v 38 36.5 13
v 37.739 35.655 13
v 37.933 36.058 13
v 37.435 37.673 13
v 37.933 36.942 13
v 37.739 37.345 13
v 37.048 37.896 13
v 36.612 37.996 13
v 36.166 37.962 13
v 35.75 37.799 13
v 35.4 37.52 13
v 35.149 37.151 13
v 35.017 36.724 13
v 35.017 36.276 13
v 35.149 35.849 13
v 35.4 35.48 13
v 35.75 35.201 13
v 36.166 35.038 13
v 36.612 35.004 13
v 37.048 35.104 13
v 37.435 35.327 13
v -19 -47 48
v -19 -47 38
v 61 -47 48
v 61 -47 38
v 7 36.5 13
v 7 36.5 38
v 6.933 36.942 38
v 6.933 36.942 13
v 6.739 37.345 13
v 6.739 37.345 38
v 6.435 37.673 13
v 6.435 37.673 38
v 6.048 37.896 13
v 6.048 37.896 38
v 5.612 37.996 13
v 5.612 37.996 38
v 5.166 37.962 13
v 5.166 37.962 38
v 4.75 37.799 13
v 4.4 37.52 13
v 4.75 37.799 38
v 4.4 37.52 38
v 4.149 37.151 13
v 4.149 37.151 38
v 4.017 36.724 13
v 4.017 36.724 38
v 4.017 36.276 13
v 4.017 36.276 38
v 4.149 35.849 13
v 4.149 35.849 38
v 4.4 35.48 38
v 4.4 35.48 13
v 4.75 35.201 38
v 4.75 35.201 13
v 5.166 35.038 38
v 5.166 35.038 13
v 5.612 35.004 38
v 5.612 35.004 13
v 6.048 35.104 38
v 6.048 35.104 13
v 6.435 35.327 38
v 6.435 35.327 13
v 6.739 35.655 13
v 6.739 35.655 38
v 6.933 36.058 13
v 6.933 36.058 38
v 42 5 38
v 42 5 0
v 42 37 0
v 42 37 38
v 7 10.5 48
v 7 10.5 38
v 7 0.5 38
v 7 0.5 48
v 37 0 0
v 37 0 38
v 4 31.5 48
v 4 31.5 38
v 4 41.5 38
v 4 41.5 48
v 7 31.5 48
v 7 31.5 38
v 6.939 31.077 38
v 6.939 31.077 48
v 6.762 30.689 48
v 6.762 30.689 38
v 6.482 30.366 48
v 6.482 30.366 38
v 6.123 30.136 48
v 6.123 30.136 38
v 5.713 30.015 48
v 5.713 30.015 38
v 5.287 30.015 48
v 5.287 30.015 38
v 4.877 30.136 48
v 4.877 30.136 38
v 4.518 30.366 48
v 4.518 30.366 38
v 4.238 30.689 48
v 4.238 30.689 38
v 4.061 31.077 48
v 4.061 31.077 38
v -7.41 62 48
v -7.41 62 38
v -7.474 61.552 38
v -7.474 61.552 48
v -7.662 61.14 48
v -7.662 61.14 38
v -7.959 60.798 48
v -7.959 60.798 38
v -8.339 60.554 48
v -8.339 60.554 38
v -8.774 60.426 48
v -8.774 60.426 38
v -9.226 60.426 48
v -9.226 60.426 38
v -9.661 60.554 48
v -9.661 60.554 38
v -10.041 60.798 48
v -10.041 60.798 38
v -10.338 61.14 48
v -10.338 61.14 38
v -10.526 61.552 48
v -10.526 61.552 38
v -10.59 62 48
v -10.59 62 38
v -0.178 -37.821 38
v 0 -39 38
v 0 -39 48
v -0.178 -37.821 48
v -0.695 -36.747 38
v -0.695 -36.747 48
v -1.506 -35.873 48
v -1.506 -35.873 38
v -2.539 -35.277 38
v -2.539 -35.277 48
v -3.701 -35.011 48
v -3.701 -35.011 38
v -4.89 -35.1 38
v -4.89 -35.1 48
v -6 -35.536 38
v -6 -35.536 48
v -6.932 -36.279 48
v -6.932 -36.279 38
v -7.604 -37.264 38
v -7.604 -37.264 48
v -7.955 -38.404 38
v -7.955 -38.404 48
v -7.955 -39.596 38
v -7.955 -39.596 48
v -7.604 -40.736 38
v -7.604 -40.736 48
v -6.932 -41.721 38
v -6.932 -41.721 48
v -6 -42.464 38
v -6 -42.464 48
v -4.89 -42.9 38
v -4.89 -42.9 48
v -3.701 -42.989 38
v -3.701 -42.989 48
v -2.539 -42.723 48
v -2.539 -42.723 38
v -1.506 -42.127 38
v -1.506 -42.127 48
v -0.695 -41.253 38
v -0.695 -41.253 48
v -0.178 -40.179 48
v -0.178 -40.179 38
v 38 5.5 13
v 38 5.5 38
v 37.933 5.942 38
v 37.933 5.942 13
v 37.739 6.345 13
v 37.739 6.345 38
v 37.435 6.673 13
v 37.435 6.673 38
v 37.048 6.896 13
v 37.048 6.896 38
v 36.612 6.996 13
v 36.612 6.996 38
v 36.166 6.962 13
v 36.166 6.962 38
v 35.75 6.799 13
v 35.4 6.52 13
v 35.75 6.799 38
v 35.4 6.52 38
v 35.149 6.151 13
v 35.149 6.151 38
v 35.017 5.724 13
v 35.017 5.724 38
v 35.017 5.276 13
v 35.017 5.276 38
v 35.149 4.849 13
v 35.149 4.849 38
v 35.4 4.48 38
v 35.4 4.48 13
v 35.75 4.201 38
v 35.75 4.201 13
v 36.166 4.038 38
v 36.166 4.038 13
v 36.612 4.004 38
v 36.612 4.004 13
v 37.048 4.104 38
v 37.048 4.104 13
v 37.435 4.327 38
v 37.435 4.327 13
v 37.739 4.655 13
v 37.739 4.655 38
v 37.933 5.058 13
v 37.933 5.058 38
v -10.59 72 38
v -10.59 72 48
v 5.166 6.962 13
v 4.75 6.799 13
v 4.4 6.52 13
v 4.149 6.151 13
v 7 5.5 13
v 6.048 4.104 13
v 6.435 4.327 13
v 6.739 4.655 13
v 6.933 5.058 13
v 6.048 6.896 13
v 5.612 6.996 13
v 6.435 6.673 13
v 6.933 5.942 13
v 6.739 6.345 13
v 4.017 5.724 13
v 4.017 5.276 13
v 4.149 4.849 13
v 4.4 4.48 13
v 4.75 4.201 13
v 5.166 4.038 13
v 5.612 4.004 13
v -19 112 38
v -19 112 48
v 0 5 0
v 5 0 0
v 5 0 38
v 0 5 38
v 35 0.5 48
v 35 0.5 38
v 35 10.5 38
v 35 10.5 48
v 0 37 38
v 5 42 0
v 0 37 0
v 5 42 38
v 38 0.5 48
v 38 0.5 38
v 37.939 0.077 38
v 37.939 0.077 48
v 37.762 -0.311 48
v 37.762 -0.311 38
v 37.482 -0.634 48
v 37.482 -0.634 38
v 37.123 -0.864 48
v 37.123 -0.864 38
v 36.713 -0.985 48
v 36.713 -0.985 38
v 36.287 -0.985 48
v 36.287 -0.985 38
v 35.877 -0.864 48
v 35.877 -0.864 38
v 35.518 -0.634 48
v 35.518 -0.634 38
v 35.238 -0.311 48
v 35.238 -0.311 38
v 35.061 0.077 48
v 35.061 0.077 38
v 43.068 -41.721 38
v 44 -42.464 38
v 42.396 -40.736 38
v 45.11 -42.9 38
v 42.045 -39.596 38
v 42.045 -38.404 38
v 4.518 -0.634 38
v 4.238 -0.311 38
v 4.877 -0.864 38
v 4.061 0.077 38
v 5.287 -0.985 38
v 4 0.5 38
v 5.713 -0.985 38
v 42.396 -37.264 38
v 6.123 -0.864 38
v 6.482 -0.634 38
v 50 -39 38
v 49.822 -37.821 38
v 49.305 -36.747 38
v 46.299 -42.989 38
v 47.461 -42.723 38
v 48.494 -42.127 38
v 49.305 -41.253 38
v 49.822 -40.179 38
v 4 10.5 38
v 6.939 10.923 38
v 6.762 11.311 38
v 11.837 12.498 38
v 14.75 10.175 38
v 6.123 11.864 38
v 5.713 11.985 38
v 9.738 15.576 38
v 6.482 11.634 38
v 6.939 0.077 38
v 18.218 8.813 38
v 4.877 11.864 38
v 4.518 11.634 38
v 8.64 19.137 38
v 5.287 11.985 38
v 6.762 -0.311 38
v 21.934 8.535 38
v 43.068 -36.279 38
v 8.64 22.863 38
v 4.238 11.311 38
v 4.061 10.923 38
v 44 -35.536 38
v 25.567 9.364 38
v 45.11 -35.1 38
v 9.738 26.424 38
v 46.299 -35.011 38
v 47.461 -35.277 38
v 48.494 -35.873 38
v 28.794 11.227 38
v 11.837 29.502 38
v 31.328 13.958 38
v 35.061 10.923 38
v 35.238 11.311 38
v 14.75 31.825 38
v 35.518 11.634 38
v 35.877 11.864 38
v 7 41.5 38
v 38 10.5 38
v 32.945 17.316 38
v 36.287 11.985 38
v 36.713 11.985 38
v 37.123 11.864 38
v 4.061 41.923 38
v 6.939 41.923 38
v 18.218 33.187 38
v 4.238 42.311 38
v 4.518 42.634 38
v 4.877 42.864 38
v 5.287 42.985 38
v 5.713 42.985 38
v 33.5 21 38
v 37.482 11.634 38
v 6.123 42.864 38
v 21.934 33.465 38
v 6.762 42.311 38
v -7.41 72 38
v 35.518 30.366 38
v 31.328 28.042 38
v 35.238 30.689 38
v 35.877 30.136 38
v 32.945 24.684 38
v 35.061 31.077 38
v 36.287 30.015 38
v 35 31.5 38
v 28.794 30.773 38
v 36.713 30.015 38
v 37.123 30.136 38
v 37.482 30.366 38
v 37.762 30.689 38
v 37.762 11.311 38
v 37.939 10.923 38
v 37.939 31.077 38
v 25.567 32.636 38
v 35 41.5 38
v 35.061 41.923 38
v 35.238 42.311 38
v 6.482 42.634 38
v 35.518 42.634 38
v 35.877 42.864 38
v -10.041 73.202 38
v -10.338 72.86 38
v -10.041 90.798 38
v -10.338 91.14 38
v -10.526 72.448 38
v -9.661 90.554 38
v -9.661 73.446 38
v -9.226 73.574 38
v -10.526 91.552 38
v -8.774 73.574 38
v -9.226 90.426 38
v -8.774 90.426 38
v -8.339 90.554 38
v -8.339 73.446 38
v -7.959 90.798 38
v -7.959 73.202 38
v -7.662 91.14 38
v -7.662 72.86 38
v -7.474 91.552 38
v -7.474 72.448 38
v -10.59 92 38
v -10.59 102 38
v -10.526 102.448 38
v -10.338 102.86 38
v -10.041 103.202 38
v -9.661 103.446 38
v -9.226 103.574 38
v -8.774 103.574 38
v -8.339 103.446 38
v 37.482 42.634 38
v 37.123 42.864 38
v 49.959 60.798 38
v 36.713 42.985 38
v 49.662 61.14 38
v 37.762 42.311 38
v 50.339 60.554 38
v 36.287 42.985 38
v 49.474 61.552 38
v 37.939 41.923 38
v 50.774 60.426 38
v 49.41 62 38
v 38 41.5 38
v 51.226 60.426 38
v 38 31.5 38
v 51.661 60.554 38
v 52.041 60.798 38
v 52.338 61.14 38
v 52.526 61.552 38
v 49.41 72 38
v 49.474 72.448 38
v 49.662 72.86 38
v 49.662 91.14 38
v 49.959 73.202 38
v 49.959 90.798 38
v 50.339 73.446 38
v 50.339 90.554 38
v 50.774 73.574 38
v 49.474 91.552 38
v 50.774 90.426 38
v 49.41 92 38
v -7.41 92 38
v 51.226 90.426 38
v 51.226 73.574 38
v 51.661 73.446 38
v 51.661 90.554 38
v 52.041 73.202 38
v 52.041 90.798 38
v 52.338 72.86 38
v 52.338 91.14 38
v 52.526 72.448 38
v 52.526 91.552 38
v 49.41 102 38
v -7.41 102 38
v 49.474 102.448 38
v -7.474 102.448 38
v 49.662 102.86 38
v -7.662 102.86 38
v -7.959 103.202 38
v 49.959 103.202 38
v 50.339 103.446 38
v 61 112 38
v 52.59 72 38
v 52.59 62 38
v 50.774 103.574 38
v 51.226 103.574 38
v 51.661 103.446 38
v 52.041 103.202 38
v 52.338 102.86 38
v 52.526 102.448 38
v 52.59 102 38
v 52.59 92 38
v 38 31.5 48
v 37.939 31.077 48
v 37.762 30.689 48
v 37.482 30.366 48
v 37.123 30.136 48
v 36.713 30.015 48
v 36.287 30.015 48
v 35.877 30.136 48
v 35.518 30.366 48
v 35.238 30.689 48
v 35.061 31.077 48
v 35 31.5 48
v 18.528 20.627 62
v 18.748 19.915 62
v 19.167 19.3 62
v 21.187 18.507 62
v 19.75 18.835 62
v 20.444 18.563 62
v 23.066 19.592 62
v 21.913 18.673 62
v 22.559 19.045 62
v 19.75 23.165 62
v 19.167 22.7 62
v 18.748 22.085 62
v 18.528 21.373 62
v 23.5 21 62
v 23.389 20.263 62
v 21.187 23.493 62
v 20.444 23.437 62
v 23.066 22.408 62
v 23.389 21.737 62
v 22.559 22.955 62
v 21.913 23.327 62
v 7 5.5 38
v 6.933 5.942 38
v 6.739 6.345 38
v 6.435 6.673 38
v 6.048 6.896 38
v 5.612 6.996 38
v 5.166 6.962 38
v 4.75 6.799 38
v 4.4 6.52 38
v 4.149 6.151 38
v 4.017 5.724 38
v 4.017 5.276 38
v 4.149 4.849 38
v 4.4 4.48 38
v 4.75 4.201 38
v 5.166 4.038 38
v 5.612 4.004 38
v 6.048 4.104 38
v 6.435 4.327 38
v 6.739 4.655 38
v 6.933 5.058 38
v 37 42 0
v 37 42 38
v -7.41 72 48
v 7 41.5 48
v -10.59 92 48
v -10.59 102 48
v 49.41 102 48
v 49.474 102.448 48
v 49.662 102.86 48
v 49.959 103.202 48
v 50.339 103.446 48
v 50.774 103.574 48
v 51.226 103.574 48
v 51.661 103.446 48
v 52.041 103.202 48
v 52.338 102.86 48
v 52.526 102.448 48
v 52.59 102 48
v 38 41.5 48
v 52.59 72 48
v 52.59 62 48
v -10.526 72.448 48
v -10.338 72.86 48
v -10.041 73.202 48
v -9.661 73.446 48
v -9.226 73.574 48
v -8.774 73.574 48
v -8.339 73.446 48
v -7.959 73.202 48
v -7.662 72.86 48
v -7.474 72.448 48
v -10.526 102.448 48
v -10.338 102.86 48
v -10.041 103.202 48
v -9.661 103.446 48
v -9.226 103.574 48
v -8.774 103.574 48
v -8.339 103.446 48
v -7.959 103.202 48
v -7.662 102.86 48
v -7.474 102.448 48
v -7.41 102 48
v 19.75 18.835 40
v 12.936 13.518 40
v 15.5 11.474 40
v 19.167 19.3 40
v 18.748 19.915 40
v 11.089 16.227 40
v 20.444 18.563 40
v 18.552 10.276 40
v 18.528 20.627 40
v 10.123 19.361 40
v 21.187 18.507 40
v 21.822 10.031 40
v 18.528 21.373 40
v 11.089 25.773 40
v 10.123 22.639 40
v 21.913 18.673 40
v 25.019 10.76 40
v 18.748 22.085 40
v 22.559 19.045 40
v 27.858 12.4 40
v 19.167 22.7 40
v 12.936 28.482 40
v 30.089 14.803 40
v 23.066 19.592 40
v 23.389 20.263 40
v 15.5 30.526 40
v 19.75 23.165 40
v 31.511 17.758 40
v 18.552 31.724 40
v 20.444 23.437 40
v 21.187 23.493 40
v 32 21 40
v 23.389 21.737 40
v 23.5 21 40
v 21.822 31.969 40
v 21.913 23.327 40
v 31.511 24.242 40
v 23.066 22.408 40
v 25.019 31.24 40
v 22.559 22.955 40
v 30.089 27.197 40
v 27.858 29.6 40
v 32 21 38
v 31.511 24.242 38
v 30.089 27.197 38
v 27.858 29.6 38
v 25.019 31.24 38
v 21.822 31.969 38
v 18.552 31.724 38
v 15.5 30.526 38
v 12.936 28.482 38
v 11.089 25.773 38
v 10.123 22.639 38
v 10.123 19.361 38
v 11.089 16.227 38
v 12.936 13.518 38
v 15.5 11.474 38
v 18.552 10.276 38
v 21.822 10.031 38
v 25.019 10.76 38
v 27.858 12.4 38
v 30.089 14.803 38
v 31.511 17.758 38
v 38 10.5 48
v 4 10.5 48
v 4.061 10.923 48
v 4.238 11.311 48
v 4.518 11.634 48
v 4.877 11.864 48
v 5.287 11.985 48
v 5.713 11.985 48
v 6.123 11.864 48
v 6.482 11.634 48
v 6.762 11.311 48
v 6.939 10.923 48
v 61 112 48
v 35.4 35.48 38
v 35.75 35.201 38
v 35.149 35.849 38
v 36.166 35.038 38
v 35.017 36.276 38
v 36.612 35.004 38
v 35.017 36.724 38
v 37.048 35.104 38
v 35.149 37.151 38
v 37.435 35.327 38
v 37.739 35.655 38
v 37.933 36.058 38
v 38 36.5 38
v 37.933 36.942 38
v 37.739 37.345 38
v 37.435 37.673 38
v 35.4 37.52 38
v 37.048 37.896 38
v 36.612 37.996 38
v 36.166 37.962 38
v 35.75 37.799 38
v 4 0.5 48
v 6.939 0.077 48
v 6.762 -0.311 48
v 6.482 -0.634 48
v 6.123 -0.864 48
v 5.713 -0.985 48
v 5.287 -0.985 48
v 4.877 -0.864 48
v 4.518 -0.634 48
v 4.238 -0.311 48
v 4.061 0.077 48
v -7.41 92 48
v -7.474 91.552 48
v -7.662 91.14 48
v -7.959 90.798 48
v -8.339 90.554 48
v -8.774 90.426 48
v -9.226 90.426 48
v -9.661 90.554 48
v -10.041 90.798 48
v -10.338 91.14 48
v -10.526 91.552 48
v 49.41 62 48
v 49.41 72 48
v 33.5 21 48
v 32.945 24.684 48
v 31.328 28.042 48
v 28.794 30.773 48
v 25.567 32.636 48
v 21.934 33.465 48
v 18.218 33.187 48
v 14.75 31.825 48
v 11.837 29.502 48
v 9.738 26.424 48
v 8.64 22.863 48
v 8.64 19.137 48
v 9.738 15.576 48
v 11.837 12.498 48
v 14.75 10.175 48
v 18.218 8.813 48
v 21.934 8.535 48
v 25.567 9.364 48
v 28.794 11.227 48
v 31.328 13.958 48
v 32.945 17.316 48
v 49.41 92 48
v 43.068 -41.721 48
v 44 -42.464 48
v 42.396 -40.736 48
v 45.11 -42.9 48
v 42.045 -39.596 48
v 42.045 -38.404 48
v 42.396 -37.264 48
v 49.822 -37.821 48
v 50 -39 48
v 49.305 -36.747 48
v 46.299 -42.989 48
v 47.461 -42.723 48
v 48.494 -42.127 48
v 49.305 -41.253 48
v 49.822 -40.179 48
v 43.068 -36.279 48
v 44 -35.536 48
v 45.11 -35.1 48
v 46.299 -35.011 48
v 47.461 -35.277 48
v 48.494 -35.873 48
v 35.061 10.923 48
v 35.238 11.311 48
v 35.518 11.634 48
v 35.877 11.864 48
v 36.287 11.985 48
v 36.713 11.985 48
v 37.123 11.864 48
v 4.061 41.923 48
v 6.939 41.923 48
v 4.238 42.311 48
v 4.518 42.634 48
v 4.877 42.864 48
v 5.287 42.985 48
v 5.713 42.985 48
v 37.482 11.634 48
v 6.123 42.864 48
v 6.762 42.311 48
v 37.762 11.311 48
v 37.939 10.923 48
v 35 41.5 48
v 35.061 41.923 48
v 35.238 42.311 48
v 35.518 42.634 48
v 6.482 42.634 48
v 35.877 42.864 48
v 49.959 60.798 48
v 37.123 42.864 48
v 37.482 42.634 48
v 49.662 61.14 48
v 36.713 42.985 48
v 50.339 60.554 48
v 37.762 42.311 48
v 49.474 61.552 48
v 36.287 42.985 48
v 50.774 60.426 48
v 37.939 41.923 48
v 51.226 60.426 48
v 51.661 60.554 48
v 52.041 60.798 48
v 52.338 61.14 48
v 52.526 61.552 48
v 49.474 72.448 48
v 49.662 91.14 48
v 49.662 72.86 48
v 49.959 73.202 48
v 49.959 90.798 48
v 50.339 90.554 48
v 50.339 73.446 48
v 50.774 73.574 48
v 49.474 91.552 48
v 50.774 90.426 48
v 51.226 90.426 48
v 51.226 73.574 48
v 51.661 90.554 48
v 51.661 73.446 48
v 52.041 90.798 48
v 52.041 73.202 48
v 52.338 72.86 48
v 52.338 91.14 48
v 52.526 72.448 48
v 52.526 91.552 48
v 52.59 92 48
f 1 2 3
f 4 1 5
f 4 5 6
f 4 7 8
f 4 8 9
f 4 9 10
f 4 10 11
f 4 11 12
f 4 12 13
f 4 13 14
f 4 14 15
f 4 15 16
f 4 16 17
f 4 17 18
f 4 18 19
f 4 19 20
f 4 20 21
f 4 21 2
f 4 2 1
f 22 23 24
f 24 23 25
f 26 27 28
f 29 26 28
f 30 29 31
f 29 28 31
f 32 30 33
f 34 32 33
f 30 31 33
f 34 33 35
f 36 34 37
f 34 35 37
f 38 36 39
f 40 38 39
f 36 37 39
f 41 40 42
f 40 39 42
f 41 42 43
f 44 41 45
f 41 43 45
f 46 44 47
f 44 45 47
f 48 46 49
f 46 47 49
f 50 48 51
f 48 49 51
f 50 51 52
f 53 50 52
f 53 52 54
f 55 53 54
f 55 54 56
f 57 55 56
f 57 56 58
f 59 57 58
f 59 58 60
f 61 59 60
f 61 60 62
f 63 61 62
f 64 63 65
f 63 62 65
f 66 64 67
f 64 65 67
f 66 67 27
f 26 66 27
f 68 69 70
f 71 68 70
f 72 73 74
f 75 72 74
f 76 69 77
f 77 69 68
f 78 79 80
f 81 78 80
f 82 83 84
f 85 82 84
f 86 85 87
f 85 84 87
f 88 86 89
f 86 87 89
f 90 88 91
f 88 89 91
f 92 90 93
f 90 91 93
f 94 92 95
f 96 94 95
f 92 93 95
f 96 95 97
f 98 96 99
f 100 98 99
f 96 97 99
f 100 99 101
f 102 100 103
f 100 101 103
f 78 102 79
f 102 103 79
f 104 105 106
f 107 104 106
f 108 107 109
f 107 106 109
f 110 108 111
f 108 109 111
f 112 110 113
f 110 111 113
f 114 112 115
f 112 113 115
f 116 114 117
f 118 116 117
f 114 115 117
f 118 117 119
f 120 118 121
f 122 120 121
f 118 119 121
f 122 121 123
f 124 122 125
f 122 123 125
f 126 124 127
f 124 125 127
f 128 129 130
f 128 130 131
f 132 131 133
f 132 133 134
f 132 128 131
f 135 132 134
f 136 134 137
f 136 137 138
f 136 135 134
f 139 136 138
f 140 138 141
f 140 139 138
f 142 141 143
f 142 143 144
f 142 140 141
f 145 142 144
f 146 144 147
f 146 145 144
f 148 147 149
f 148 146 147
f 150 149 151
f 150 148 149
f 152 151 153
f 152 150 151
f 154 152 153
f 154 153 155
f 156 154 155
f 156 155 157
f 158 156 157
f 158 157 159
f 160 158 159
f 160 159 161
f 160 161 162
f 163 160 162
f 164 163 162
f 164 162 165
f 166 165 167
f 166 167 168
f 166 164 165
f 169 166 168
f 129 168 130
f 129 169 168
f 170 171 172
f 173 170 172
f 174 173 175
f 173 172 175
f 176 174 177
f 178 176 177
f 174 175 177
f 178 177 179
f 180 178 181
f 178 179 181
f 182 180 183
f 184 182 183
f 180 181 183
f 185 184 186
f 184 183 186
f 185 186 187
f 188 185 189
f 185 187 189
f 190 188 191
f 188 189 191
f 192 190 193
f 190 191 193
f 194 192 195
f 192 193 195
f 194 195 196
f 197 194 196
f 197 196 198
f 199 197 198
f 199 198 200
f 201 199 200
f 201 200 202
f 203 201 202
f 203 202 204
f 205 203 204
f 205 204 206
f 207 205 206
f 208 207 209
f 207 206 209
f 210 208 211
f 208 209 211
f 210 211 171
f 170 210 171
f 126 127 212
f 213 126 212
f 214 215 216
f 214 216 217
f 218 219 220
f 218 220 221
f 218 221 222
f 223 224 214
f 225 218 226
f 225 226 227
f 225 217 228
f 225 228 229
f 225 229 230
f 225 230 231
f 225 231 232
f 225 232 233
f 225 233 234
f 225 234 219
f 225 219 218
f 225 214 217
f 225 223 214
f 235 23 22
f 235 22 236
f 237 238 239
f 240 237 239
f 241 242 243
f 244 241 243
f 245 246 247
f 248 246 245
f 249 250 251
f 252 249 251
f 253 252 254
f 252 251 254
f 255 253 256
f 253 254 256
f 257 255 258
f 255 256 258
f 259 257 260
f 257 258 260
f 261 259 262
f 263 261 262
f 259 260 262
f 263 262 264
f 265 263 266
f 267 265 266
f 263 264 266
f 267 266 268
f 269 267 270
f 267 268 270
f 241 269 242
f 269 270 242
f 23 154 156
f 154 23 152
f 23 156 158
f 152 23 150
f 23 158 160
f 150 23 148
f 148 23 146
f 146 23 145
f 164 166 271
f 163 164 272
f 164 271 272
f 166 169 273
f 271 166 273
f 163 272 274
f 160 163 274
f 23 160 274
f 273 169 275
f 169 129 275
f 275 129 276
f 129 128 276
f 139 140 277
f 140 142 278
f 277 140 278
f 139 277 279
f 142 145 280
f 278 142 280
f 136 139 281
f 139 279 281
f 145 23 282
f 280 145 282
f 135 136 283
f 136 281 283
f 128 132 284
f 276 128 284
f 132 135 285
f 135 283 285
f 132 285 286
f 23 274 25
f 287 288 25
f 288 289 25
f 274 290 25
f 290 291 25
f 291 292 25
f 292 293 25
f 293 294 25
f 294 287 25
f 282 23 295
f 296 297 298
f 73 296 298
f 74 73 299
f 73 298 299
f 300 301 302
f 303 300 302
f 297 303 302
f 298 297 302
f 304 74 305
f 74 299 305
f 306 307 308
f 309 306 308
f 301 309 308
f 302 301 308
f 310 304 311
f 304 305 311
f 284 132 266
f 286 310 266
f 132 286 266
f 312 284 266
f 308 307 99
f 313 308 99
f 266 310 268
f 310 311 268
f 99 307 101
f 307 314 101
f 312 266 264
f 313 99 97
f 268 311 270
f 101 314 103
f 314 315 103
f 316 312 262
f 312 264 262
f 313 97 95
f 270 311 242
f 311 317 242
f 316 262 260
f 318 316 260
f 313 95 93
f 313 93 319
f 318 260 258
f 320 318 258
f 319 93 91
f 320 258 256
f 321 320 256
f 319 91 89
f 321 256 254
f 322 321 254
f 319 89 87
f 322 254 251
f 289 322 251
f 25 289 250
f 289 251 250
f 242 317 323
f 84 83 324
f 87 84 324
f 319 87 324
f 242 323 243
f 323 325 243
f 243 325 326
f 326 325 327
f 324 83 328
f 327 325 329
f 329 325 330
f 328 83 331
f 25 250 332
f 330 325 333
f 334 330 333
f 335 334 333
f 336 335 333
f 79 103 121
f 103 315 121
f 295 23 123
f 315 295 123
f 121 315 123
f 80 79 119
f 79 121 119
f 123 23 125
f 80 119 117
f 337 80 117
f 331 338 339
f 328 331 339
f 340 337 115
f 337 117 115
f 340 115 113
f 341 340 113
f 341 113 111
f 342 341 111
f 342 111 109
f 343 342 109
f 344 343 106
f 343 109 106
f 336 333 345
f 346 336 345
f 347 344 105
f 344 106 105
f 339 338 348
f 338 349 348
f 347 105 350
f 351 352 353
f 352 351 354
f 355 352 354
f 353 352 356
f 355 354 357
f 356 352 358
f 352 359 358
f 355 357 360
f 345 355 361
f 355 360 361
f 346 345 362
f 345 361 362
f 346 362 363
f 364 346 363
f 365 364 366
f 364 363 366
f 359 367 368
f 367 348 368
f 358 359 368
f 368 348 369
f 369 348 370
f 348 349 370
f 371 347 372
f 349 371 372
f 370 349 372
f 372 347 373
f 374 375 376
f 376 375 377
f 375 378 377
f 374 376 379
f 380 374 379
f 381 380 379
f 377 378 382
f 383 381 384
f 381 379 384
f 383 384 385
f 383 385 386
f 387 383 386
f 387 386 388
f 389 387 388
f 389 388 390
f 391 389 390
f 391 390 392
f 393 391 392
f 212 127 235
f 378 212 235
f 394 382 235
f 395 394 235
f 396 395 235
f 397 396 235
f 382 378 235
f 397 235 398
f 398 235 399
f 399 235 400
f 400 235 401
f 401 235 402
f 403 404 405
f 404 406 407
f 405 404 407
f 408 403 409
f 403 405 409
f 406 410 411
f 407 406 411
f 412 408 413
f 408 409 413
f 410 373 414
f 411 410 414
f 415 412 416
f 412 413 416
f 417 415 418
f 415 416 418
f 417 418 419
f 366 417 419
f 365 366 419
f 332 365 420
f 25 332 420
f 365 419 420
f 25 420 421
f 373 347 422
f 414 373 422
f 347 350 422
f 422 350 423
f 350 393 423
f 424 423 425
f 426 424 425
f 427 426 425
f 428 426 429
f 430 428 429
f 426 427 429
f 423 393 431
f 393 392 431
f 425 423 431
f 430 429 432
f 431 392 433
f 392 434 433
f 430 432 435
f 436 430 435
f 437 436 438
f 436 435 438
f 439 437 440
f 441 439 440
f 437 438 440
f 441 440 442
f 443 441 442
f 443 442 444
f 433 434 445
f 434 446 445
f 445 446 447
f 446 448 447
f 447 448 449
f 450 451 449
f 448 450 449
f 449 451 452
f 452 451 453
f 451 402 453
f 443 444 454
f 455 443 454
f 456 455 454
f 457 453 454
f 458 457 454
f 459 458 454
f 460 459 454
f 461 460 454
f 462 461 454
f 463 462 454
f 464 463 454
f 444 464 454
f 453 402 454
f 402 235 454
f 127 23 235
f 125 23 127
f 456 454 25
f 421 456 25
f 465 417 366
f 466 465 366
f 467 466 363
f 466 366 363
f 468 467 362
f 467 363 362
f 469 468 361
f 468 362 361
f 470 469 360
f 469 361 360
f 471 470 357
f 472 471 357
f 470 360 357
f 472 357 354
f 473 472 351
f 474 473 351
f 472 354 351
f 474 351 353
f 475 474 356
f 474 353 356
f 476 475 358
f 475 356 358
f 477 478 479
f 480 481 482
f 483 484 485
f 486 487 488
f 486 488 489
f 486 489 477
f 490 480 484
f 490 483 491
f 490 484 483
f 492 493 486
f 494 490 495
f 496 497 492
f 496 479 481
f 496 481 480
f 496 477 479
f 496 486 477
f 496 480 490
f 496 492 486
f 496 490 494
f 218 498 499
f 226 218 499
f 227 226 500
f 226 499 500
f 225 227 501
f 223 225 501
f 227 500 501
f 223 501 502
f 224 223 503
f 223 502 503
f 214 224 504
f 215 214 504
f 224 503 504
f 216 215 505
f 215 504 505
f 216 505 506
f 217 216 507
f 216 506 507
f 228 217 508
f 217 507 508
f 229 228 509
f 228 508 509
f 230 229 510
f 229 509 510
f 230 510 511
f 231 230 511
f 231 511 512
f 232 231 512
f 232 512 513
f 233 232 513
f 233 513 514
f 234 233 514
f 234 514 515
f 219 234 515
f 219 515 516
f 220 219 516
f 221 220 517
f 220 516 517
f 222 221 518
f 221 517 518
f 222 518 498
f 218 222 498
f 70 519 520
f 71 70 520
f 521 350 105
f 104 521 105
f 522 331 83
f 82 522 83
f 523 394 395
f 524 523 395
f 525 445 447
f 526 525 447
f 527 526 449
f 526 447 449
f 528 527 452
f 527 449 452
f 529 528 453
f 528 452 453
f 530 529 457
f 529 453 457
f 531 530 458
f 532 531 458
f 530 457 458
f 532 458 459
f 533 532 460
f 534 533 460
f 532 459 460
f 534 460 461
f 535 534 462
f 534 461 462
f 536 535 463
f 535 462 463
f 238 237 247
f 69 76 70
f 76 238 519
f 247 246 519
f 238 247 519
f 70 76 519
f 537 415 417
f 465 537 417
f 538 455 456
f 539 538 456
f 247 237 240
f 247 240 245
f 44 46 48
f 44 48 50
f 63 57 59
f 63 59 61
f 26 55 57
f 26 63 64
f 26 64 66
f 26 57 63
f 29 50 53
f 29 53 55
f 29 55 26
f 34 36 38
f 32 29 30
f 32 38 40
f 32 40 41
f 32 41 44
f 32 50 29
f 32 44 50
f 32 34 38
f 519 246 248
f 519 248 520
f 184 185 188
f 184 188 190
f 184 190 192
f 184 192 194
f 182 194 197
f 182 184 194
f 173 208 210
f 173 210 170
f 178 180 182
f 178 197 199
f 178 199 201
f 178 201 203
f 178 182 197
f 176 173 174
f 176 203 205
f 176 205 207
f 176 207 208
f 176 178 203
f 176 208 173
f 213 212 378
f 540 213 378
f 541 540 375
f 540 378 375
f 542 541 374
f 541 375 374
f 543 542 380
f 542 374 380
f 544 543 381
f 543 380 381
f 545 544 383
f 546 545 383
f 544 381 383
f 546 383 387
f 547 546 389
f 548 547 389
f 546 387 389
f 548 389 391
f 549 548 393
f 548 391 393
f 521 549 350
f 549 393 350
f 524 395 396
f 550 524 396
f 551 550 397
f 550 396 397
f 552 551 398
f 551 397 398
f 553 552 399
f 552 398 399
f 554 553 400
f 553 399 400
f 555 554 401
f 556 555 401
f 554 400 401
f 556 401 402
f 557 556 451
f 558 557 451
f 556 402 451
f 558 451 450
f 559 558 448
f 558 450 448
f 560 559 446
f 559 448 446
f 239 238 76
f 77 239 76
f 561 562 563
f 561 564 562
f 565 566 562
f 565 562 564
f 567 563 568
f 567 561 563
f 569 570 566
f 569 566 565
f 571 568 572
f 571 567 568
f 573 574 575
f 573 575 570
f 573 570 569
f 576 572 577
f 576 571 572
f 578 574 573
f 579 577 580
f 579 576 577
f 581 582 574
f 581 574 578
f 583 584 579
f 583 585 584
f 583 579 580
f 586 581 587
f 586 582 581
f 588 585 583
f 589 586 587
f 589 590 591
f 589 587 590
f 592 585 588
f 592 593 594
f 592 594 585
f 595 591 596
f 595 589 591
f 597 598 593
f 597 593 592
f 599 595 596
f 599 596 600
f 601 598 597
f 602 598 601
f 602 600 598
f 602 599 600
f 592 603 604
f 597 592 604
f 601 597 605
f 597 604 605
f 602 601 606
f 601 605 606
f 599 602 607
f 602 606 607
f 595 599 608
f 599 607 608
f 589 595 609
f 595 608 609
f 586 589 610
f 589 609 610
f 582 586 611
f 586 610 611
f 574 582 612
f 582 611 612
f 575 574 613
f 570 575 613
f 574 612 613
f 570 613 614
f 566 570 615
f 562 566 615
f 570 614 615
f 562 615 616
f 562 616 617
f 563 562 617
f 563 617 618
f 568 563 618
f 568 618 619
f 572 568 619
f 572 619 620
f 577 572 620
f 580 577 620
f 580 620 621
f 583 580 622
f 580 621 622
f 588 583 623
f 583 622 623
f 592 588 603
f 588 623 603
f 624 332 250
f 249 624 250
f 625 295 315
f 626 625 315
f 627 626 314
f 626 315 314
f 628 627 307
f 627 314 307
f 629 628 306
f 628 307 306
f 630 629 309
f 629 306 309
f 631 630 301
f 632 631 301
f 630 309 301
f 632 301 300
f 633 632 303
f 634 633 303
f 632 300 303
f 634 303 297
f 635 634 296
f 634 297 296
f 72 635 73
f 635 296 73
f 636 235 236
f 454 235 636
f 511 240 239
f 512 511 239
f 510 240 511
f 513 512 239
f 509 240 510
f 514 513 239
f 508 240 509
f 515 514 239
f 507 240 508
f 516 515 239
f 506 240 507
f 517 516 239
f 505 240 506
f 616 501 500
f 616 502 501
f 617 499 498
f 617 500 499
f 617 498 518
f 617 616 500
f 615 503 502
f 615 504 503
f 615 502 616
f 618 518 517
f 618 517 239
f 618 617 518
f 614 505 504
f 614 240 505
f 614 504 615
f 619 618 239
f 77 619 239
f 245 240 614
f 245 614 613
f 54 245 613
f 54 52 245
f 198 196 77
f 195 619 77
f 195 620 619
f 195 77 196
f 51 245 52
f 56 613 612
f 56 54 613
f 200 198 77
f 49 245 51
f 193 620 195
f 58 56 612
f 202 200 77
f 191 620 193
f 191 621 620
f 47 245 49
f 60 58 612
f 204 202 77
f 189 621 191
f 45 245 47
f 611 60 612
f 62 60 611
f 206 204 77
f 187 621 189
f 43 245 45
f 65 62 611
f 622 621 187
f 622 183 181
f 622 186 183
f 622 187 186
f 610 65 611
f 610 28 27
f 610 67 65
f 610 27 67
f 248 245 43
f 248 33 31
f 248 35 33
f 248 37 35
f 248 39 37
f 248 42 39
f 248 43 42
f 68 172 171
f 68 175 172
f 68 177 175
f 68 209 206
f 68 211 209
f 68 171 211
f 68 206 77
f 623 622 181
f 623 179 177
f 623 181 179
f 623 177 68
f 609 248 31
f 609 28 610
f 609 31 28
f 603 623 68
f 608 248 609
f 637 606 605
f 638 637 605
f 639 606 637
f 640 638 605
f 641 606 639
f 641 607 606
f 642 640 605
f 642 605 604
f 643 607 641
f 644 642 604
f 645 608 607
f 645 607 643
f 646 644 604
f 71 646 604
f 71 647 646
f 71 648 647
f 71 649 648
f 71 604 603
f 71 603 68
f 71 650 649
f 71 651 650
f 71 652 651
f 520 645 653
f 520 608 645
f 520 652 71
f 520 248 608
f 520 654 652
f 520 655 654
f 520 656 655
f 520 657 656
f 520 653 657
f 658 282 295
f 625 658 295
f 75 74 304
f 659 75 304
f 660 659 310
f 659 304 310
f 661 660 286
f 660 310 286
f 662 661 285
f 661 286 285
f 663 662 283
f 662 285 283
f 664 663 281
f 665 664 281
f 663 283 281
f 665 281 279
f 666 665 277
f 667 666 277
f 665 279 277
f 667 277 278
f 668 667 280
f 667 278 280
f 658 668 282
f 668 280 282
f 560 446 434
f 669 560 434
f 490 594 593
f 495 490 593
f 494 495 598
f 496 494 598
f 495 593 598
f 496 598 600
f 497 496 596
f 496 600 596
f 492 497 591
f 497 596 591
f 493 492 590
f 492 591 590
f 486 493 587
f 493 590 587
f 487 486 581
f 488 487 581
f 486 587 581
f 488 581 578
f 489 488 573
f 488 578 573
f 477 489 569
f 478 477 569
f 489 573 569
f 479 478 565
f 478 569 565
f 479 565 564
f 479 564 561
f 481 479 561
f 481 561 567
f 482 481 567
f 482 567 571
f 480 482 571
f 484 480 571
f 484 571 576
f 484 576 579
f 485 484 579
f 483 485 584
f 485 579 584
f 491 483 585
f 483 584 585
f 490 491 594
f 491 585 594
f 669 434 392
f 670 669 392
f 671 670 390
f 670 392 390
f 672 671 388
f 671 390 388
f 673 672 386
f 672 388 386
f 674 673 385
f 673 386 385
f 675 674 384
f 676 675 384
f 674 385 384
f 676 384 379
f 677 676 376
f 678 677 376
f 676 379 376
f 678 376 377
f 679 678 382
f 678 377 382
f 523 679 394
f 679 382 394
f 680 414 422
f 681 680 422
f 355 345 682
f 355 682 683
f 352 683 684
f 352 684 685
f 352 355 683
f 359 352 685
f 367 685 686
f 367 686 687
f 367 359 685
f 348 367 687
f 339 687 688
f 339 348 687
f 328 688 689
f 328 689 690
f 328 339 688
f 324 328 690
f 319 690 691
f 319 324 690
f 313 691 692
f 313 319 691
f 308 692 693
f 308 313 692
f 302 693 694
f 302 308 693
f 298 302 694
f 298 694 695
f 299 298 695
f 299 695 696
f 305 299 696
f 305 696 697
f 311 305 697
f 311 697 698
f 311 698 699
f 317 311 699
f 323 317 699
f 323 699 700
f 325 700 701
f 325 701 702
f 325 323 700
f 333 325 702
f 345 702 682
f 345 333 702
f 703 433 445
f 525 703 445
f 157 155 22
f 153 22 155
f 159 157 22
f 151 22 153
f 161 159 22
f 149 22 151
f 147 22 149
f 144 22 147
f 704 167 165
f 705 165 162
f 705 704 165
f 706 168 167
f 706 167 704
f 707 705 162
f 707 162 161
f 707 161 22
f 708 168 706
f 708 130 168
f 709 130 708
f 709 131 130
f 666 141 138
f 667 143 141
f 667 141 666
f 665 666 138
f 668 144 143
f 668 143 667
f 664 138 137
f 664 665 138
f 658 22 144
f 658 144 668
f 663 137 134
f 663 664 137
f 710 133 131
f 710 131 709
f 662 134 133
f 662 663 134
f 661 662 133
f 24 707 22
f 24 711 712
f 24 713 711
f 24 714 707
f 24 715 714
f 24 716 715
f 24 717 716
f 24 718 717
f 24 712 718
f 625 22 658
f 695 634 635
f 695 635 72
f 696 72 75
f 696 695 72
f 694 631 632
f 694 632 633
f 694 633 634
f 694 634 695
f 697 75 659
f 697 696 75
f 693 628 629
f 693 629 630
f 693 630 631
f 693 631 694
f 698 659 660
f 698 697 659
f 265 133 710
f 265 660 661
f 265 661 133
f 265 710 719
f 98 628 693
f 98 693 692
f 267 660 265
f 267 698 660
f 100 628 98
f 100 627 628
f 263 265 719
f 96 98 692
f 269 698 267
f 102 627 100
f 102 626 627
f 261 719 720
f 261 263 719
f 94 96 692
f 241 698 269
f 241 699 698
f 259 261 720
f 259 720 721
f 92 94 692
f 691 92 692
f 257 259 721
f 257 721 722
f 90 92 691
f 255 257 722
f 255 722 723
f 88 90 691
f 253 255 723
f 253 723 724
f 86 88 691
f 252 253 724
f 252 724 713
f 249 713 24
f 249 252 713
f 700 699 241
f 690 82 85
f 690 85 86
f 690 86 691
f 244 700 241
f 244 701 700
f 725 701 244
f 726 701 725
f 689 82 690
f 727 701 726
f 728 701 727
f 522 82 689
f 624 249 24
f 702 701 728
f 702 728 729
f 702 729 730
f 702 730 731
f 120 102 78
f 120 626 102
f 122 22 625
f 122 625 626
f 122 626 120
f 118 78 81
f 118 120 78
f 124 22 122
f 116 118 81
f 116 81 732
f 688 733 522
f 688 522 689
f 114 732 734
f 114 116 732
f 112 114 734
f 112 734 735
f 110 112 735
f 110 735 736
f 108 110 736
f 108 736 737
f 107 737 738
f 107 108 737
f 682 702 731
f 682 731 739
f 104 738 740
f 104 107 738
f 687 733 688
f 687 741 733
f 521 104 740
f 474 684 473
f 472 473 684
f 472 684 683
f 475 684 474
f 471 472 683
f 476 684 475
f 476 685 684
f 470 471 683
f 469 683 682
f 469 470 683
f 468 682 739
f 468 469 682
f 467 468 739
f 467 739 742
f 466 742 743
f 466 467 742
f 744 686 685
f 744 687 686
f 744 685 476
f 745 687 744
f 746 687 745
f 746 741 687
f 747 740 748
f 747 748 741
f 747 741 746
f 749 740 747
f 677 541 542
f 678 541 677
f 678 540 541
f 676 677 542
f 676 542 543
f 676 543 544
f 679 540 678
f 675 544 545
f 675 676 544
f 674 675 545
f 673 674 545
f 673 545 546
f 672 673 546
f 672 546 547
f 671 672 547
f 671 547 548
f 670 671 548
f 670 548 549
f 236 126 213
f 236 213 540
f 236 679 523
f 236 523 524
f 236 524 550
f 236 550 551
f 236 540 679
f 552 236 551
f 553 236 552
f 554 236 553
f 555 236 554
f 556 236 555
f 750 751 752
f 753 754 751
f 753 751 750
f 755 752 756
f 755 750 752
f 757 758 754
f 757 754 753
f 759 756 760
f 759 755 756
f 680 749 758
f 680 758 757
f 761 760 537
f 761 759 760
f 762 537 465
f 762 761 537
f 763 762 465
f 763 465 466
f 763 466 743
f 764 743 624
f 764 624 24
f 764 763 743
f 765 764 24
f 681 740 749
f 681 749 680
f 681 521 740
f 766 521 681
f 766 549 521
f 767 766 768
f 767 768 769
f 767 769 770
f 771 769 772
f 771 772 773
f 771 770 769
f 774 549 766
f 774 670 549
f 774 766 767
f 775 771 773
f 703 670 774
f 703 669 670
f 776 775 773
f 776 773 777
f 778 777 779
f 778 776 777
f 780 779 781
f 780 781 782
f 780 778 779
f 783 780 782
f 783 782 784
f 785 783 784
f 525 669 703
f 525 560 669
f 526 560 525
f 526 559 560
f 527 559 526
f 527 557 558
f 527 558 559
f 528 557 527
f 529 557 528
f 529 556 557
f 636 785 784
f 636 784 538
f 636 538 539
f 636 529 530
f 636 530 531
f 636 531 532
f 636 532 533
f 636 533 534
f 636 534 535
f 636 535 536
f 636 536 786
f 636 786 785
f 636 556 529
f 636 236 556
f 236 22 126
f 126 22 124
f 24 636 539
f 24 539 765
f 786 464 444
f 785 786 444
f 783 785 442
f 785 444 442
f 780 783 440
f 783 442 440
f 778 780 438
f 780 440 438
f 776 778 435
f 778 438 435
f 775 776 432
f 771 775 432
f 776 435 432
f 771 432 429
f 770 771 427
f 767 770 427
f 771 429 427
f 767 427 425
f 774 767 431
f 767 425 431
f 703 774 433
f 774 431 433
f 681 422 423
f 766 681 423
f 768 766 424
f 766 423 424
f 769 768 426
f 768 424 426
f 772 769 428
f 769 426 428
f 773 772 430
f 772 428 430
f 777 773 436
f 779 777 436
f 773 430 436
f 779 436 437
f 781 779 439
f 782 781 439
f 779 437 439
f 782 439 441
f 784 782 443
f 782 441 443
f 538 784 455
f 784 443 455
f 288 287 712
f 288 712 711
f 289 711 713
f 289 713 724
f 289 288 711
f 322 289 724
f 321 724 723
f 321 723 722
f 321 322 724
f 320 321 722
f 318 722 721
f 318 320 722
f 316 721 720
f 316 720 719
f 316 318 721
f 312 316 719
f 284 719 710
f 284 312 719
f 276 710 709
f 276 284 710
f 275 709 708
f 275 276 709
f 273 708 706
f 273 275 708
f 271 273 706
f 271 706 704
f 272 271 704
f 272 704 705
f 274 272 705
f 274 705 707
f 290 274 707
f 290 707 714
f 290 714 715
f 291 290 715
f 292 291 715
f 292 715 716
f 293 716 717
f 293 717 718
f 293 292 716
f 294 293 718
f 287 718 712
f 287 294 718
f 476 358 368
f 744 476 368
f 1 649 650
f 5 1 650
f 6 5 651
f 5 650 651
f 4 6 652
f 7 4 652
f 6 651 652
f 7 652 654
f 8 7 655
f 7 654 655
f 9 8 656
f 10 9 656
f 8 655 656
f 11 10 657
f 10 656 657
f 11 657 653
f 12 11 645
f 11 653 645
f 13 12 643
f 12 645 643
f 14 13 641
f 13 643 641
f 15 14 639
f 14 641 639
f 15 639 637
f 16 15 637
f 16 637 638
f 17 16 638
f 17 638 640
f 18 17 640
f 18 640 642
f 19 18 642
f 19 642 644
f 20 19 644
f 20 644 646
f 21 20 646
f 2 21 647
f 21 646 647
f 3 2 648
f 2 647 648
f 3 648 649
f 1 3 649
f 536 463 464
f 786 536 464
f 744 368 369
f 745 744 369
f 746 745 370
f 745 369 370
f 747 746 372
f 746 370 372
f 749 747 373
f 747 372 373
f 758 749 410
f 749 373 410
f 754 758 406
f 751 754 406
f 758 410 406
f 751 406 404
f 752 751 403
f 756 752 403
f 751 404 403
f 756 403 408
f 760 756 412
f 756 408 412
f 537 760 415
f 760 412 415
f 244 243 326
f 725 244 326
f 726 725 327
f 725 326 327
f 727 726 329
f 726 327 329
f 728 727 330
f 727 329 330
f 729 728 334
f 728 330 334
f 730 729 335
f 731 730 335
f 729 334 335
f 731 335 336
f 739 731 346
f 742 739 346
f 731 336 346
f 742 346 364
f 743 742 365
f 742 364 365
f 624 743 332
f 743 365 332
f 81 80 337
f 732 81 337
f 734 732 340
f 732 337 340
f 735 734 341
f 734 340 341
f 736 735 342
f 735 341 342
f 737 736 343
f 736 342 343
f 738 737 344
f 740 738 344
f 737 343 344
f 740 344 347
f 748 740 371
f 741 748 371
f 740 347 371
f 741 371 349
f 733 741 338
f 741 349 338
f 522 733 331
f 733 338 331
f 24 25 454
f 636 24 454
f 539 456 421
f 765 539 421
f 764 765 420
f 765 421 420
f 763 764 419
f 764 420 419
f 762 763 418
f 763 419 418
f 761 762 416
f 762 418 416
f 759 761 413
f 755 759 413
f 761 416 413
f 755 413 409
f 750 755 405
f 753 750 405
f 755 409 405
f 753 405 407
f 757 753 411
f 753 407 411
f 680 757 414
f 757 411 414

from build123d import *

# Parameters (mm, degrees)
F0_W      = 42
F0_H      = 42
F1_DEPTH  = 38
F2_SIZE   = 5
F3_R      = 11
F4_DEPTH  = 2
F5_R      = 2.5
F6_DEPTH  = 22
F7_R      = 1.5
F8_DEPTH  = 25
F9_W      = 80
F9_H      = 159
F9_R      = 4
F9_R_2    = 12.5
F10_DEPTH = 10


with BuildPart() as f1:
    # F0 (on Top) → F1 (new body)
    with BuildSketch(Plane.XY):
        with Locations((21, 21)):
            Rectangle(F0_W, F0_H)
    extrude(amount=F1_DEPTH)

    # F2
    f2_edges = [f1.edges().sort_by_distance(p)[0] for p in [
        (0, 0, 19),
        (0, 42, 19),
        (42, 0, 19),
        (42, 42, 19),
    ]]
    chamfer(f2_edges, length=F2_SIZE)

    # F3 (on face) → F4 (join)
    with BuildSketch(Plane.XY.offset(38)):
        with Locations((21, 21)):
            Circle(F3_R)
    extrude(amount=F4_DEPTH)

    # F5 (on face) → F6 (join)
    with BuildSketch(Plane.XY.offset(40)):
        with Locations((21, 21)):
            Circle(F5_R)
    extrude(amount=F6_DEPTH)

    # F7 (on face) → F8 (cut)
    with BuildSketch(Plane.XY.offset(38)):
        with Locations((5.5, 36.5)):
            Circle(F7_R)
        with Locations((5.5, 5.5)):
            Circle(F7_R)
        with Locations((36.5, 36.5)):
            Circle(F7_R)
        with Locations((36.5, 5.5)):
            Circle(F7_R)
    extrude(amount=-F8_DEPTH, mode=Mode.SUBTRACT)


with BuildPart() as f10:
    # F9 (on face) → F10 (new body)
    with BuildSketch(Plane.XY.offset(38)):
        with Locations((21, 32.5)):
            Rectangle(F9_W, F9_H)
        with Locations((-4, -39)):
            Circle(F9_R, mode=Mode.SUBTRACT)
        with BuildLine():
            ThreePointArc((7, 0.5), (5.5, -1), (4, 0.5))
            Line((4, 0.5), (4, 10.5))
            ThreePointArc((4, 10.5), (5.5, 12), (7, 10.5))
            Line((7, 10.5), (7, 0.5))
        make_face(mode=Mode.SUBTRACT)
        with Locations((46, -39)):
            Circle(F9_R, mode=Mode.SUBTRACT)
        with BuildLine():
            Line((38, 10.5), (38, 0.5))
            ThreePointArc((38, 0.5), (36.5, -1), (35, 0.5))
            Line((35, 0.5), (35, 10.5))
            ThreePointArc((35, 10.5), (36.5, 12), (38, 10.5))
        make_face(mode=Mode.SUBTRACT)
        with Locations((21, 21)):
            Circle(F9_R_2, mode=Mode.SUBTRACT)
        with BuildLine():
            ThreePointArc((-10.59, 72), (-9, 73.59), (-7.41, 72))
            Line((-7.41, 72), (-7.41, 62))
            ThreePointArc((-7.41, 62), (-9, 60.41), (-10.59, 62))
            Line((-10.59, 62), (-10.59, 72))
        make_face(mode=Mode.SUBTRACT)
        with BuildLine():
            Line((4, 31.5), (4, 41.5))
            ThreePointArc((4, 41.5), (5.5, 43), (7, 41.5))
            Line((7, 41.5), (7, 31.5))
            ThreePointArc((7, 31.5), (5.5, 30), (4, 31.5))
        make_face(mode=Mode.SUBTRACT)
        with BuildLine():
            Line((-10.59, 92), (-10.59, 102))
            ThreePointArc((-10.59, 102), (-9, 103.59), (-7.41, 102))
            Line((-7.41, 102), (-7.41, 92))
            ThreePointArc((-7.41, 92), (-9, 90.41), (-10.59, 92))
        make_face(mode=Mode.SUBTRACT)
        with BuildLine():
            Line((35, 31.5), (35, 41.5))
            ThreePointArc((35, 41.5), (36.5, 43), (38, 41.5))
            Line((38, 41.5), (38, 31.5))
            ThreePointArc((38, 31.5), (36.5, 30), (35, 31.5))
        make_face(mode=Mode.SUBTRACT)
        with BuildLine():
            ThreePointArc((49.41, 72), (51, 73.59), (52.59, 72))
            Line((52.59, 72), (52.59, 62))
            ThreePointArc((52.59, 62), (51, 60.41), (49.41, 62))
            Line((49.41, 62), (49.41, 72))
        make_face(mode=Mode.SUBTRACT)
        with BuildLine():
            ThreePointArc((49.41, 102), (51, 103.59), (52.59, 102))
            Line((52.59, 102), (52.59, 92))
            ThreePointArc((52.59, 92), (51, 90.41), (49.41, 92))
            Line((49.41, 92), (49.41, 102))
        make_face(mode=Mode.SUBTRACT)
    extrude(amount=F10_DEPTH)


solid = Compound([f1.part, f10.part])
